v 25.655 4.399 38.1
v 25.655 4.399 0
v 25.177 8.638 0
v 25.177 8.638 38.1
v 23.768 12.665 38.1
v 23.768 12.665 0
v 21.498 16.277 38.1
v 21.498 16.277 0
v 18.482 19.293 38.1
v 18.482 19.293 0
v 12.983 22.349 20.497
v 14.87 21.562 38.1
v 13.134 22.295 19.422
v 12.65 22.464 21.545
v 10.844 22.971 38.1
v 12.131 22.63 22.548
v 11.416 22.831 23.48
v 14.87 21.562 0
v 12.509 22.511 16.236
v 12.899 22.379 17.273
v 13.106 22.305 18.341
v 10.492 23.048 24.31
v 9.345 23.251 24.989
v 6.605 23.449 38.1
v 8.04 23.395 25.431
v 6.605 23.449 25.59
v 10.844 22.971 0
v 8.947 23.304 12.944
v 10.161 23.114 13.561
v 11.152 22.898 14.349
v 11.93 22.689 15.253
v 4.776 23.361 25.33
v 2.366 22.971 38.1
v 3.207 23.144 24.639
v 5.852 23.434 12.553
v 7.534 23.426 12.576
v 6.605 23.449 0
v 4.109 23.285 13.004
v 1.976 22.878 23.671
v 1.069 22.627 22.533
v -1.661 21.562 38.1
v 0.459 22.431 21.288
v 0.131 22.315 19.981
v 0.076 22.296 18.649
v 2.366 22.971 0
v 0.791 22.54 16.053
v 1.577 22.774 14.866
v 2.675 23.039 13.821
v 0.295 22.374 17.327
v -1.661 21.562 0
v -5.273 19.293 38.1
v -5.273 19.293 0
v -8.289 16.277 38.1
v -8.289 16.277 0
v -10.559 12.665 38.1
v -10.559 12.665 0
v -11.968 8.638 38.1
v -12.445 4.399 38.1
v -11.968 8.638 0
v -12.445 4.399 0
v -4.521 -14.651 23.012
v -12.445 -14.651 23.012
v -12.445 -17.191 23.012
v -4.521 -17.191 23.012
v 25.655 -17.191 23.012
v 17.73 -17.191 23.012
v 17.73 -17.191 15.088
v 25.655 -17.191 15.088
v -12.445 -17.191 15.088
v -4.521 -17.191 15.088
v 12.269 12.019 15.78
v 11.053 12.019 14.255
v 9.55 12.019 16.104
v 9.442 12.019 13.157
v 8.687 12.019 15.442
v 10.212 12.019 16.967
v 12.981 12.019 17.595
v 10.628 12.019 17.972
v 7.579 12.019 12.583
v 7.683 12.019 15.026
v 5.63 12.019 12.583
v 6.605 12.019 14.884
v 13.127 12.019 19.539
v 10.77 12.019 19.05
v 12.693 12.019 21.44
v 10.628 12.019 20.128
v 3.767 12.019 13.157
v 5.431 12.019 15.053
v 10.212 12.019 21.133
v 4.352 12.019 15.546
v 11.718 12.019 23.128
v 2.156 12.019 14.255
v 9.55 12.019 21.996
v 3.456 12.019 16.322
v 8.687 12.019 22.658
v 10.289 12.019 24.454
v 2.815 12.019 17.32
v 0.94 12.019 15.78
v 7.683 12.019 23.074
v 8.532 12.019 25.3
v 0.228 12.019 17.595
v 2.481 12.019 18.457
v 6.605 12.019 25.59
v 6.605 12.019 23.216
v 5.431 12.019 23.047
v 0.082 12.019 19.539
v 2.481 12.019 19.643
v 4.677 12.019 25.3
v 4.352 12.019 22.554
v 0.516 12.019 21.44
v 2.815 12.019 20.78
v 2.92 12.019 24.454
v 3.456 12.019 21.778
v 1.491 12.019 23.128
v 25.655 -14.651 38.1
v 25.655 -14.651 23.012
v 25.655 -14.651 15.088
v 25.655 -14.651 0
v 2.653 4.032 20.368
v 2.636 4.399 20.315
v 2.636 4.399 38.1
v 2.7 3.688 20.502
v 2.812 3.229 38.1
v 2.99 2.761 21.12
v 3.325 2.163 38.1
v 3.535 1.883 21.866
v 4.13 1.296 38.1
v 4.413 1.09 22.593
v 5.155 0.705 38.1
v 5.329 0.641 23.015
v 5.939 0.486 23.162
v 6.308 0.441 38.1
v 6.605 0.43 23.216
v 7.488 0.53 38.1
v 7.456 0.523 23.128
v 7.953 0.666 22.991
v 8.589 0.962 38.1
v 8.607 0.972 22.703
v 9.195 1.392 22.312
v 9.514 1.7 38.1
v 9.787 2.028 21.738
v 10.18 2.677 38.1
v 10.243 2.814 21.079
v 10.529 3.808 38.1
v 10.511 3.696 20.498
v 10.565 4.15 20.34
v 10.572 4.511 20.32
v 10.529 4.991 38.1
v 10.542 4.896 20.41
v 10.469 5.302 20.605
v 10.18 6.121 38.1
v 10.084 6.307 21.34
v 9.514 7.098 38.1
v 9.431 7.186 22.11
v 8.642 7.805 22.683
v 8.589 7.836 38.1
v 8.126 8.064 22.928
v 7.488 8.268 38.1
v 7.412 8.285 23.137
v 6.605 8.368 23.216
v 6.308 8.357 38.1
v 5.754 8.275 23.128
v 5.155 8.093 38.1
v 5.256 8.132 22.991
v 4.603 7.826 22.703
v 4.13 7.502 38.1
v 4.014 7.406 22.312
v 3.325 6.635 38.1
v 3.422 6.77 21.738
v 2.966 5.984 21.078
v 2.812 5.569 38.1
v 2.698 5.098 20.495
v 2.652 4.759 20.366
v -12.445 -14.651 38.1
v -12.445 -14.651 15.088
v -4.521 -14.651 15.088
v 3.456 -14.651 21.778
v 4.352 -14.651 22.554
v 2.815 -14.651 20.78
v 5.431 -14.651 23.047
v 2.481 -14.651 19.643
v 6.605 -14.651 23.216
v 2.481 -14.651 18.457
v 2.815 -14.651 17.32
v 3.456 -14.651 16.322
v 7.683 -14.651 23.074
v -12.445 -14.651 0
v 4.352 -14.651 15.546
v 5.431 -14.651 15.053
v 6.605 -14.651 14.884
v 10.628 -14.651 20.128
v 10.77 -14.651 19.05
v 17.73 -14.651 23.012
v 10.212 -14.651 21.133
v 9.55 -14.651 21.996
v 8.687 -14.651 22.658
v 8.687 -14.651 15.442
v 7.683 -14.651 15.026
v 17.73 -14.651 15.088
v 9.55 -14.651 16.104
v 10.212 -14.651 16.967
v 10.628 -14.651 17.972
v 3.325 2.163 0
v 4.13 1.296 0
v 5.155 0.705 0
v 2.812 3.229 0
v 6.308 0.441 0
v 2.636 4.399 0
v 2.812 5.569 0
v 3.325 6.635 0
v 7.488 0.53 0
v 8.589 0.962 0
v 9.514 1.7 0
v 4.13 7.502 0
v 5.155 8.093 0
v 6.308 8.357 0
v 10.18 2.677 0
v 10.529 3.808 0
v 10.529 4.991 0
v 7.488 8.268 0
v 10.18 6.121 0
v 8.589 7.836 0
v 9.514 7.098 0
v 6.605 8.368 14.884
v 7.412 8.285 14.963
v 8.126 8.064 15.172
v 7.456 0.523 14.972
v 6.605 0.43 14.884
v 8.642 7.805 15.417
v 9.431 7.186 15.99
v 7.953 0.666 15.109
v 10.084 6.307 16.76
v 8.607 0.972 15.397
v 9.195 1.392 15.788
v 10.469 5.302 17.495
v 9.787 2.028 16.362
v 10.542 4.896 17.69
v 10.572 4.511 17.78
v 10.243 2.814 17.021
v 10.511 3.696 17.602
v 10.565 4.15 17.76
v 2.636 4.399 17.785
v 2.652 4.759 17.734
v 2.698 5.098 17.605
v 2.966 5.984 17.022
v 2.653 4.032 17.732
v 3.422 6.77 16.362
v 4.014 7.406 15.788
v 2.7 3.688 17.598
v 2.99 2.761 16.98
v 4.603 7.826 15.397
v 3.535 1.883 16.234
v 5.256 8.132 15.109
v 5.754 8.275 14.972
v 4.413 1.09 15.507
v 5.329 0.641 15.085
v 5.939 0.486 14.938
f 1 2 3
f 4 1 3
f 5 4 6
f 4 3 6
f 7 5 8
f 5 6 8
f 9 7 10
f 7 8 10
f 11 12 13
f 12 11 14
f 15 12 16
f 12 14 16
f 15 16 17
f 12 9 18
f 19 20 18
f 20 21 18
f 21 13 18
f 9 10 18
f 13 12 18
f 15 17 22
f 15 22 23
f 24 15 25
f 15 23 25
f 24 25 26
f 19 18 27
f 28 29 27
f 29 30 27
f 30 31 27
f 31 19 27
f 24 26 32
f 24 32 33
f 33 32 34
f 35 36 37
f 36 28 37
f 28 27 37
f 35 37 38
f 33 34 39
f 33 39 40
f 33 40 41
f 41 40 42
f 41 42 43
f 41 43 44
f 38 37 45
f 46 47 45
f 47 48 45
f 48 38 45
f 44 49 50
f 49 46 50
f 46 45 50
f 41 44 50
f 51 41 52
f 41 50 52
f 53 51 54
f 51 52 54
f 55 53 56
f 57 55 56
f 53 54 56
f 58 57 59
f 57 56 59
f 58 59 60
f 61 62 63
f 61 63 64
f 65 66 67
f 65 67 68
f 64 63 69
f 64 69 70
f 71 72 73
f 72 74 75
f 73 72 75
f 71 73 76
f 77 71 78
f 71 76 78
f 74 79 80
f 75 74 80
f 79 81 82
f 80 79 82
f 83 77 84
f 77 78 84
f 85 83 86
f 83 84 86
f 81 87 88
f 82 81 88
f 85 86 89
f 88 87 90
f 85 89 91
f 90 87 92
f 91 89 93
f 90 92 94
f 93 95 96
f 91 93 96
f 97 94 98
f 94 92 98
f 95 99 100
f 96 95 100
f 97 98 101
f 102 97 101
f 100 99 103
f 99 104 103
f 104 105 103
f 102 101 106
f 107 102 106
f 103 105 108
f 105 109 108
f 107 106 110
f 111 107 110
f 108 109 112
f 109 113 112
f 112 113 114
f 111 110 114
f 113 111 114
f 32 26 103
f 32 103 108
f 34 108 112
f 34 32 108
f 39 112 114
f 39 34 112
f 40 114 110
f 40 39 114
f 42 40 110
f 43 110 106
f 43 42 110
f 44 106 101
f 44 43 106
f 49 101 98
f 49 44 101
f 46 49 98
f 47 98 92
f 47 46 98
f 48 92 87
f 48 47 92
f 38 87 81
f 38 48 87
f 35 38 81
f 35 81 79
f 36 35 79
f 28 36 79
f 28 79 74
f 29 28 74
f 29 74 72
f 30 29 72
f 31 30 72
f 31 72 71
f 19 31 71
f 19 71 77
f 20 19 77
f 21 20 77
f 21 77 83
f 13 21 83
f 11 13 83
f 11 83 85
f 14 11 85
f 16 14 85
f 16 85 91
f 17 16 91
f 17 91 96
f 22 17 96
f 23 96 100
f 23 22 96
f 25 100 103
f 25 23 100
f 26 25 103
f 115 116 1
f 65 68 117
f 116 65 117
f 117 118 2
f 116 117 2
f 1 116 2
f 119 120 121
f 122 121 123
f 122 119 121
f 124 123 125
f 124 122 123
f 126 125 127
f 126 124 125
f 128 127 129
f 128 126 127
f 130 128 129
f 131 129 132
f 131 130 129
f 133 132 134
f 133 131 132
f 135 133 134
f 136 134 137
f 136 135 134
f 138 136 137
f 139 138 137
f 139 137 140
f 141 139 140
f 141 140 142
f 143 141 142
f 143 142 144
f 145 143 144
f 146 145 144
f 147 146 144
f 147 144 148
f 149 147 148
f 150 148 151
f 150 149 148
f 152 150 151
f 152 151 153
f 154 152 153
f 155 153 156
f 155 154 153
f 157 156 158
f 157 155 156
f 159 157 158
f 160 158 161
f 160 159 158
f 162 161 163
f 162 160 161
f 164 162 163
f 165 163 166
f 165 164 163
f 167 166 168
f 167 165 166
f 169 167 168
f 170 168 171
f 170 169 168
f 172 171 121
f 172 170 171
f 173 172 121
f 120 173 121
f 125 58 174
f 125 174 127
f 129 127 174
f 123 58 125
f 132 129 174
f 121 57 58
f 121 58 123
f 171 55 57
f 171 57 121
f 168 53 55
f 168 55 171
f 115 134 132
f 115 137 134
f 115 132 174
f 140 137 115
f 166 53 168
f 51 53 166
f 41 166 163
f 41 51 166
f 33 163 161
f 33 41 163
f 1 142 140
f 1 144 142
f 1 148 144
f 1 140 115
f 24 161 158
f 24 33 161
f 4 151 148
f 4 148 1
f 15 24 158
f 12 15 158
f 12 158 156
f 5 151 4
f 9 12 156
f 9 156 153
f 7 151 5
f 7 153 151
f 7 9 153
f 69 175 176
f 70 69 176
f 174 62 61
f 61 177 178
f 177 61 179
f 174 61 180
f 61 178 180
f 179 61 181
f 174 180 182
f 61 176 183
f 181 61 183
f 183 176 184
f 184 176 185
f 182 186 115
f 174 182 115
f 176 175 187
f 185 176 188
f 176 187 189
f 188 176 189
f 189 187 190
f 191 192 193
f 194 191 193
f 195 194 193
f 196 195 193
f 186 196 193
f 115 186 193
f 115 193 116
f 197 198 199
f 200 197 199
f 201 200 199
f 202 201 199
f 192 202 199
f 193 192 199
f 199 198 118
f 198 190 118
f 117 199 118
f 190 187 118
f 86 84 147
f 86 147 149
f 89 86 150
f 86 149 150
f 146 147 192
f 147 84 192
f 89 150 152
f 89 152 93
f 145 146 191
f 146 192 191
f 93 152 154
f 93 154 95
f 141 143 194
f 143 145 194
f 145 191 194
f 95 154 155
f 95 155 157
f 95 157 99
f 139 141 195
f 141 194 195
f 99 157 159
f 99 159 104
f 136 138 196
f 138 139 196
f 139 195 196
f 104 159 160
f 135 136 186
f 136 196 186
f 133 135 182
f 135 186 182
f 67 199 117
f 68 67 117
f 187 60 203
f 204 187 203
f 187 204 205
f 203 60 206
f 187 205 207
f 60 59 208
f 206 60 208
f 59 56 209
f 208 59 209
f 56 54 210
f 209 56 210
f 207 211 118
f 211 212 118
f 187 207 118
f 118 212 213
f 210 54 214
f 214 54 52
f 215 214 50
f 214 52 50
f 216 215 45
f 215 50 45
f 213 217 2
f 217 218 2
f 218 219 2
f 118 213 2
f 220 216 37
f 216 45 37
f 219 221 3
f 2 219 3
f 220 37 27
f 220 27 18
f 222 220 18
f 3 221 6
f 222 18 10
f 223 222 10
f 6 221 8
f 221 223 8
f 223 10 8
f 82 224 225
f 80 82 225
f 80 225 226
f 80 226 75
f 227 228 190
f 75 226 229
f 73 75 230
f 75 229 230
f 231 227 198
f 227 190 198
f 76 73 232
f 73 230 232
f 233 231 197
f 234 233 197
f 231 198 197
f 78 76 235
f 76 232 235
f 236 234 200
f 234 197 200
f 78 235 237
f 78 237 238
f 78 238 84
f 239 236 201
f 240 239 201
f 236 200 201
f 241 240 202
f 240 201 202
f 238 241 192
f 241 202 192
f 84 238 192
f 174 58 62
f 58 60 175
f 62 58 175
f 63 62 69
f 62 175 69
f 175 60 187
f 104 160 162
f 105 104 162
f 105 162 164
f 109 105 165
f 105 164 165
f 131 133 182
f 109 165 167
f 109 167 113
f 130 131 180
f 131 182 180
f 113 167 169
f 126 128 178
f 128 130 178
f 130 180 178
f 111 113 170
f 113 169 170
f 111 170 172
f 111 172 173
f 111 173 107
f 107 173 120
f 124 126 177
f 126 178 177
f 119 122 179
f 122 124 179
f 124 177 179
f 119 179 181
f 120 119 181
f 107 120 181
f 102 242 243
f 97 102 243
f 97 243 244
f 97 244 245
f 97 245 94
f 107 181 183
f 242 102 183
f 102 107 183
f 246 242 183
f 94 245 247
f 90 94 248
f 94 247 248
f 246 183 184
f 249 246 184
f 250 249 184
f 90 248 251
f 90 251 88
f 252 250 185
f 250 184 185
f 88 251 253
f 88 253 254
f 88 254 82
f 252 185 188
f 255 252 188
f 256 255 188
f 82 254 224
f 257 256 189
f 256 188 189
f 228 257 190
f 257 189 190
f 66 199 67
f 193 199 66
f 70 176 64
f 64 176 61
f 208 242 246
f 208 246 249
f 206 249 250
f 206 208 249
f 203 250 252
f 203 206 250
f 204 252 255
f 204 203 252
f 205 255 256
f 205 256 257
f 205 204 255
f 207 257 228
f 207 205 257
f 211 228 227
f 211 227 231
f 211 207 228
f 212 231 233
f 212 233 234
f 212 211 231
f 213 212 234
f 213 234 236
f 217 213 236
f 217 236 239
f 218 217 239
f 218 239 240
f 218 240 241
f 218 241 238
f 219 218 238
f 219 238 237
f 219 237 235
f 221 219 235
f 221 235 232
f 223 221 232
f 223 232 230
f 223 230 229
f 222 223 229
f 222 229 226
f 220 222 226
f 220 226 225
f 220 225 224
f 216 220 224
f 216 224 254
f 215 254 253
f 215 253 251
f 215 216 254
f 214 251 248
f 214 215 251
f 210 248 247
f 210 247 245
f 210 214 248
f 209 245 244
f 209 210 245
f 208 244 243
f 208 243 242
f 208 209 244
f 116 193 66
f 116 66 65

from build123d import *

# Parameters (mm, degrees)
SKETCH1_R          = 3.96875
EXTRUDE1_DEPTH     = 38.1
CUT_EXTRUDE1_DEPTH = 60.67726868
CUT_EXTRUDE2_START = -38.1
SKETCH3_R          = 6.5405
CUT_EXTRUDE2_DEPTH = 11.43
SKETCH4_W          = 7.9248
SKETCH4_H          = 7.9248
EXTRUDE2_DEPTH     = 2.54


with BuildPart() as part:
    # Sketch1 → Extrude1 (new body)
    with BuildSketch(Plane.XY):
        with BuildLine():
            Line((-12.445441008, 4.399037801), (-12.445441008, -14.650962199))
            Line((-12.445441008, -14.650962199), (25.654558992, -14.650962199))
            Line((25.654558992, -14.650962199), (25.654558992, 4.399037801))
            ThreePointArc((25.654558992, 4.399037801), (6.604558992, 23.449037801), (-12.445441008, 4.399037801))
        make_face()
        with Locations(Location((6.604558992, 4.399037801, 0), (0, 0, 180))):
            Circle(SKETCH1_R, mode=Mode.SUBTRACT)
    extrude(amount=EXTRUDE1_DEPTH)

    # Sketch2 → Cut-Extrude1 (cut, through all)
    with BuildSketch(Plane.XZ.offset(14.650962199)):
        with BuildLine():
            ThreePointArc((10.770158992, 19.05), (9.550083, 21.995524008), (6.604558992, 23.2156))
            Line((6.604558992, 23.2156), (6.604558992, 14.8844))
            ThreePointArc((6.604558992, 14.8844), (9.550083, 16.104475992), (10.770158992, 19.05))
        make_face()
        with BuildLine():
            Line((6.604558992, 14.8844), (6.604558992, 23.2156))
            ThreePointArc((6.604558992, 23.2156), (2.438958992, 19.05), (6.604558992, 14.8844))
        make_face()
    extrude(amount=-CUT_EXTRUDE1_DEPTH, mode=Mode.SUBTRACT)

    # Sketch3 → Cut-Extrude2 (cut)
    with BuildSketch(Plane.XZ.offset(14.650962199).offset(CUT_EXTRUDE2_START)):
        with Locations(Location((6.604558992, 19.05, 0), (0, 0, 90))):
            Circle(SKETCH3_R)
    extrude(amount=CUT_EXTRUDE2_DEPTH, mode=Mode.SUBTRACT)

    # Sketch4 → Extrude2 (add)
    with BuildSketch(Plane.XZ.offset(14.650962199)):
        with Locations((-8.483041008, 19.05)):
            Rectangle(SKETCH4_W, SKETCH4_H)
        with Locations((21.692158992, 19.05)):
            Rectangle(SKETCH4_W, SKETCH4_H)
    extrude(amount=EXTRUDE2_DEPTH)


solid = part.part
